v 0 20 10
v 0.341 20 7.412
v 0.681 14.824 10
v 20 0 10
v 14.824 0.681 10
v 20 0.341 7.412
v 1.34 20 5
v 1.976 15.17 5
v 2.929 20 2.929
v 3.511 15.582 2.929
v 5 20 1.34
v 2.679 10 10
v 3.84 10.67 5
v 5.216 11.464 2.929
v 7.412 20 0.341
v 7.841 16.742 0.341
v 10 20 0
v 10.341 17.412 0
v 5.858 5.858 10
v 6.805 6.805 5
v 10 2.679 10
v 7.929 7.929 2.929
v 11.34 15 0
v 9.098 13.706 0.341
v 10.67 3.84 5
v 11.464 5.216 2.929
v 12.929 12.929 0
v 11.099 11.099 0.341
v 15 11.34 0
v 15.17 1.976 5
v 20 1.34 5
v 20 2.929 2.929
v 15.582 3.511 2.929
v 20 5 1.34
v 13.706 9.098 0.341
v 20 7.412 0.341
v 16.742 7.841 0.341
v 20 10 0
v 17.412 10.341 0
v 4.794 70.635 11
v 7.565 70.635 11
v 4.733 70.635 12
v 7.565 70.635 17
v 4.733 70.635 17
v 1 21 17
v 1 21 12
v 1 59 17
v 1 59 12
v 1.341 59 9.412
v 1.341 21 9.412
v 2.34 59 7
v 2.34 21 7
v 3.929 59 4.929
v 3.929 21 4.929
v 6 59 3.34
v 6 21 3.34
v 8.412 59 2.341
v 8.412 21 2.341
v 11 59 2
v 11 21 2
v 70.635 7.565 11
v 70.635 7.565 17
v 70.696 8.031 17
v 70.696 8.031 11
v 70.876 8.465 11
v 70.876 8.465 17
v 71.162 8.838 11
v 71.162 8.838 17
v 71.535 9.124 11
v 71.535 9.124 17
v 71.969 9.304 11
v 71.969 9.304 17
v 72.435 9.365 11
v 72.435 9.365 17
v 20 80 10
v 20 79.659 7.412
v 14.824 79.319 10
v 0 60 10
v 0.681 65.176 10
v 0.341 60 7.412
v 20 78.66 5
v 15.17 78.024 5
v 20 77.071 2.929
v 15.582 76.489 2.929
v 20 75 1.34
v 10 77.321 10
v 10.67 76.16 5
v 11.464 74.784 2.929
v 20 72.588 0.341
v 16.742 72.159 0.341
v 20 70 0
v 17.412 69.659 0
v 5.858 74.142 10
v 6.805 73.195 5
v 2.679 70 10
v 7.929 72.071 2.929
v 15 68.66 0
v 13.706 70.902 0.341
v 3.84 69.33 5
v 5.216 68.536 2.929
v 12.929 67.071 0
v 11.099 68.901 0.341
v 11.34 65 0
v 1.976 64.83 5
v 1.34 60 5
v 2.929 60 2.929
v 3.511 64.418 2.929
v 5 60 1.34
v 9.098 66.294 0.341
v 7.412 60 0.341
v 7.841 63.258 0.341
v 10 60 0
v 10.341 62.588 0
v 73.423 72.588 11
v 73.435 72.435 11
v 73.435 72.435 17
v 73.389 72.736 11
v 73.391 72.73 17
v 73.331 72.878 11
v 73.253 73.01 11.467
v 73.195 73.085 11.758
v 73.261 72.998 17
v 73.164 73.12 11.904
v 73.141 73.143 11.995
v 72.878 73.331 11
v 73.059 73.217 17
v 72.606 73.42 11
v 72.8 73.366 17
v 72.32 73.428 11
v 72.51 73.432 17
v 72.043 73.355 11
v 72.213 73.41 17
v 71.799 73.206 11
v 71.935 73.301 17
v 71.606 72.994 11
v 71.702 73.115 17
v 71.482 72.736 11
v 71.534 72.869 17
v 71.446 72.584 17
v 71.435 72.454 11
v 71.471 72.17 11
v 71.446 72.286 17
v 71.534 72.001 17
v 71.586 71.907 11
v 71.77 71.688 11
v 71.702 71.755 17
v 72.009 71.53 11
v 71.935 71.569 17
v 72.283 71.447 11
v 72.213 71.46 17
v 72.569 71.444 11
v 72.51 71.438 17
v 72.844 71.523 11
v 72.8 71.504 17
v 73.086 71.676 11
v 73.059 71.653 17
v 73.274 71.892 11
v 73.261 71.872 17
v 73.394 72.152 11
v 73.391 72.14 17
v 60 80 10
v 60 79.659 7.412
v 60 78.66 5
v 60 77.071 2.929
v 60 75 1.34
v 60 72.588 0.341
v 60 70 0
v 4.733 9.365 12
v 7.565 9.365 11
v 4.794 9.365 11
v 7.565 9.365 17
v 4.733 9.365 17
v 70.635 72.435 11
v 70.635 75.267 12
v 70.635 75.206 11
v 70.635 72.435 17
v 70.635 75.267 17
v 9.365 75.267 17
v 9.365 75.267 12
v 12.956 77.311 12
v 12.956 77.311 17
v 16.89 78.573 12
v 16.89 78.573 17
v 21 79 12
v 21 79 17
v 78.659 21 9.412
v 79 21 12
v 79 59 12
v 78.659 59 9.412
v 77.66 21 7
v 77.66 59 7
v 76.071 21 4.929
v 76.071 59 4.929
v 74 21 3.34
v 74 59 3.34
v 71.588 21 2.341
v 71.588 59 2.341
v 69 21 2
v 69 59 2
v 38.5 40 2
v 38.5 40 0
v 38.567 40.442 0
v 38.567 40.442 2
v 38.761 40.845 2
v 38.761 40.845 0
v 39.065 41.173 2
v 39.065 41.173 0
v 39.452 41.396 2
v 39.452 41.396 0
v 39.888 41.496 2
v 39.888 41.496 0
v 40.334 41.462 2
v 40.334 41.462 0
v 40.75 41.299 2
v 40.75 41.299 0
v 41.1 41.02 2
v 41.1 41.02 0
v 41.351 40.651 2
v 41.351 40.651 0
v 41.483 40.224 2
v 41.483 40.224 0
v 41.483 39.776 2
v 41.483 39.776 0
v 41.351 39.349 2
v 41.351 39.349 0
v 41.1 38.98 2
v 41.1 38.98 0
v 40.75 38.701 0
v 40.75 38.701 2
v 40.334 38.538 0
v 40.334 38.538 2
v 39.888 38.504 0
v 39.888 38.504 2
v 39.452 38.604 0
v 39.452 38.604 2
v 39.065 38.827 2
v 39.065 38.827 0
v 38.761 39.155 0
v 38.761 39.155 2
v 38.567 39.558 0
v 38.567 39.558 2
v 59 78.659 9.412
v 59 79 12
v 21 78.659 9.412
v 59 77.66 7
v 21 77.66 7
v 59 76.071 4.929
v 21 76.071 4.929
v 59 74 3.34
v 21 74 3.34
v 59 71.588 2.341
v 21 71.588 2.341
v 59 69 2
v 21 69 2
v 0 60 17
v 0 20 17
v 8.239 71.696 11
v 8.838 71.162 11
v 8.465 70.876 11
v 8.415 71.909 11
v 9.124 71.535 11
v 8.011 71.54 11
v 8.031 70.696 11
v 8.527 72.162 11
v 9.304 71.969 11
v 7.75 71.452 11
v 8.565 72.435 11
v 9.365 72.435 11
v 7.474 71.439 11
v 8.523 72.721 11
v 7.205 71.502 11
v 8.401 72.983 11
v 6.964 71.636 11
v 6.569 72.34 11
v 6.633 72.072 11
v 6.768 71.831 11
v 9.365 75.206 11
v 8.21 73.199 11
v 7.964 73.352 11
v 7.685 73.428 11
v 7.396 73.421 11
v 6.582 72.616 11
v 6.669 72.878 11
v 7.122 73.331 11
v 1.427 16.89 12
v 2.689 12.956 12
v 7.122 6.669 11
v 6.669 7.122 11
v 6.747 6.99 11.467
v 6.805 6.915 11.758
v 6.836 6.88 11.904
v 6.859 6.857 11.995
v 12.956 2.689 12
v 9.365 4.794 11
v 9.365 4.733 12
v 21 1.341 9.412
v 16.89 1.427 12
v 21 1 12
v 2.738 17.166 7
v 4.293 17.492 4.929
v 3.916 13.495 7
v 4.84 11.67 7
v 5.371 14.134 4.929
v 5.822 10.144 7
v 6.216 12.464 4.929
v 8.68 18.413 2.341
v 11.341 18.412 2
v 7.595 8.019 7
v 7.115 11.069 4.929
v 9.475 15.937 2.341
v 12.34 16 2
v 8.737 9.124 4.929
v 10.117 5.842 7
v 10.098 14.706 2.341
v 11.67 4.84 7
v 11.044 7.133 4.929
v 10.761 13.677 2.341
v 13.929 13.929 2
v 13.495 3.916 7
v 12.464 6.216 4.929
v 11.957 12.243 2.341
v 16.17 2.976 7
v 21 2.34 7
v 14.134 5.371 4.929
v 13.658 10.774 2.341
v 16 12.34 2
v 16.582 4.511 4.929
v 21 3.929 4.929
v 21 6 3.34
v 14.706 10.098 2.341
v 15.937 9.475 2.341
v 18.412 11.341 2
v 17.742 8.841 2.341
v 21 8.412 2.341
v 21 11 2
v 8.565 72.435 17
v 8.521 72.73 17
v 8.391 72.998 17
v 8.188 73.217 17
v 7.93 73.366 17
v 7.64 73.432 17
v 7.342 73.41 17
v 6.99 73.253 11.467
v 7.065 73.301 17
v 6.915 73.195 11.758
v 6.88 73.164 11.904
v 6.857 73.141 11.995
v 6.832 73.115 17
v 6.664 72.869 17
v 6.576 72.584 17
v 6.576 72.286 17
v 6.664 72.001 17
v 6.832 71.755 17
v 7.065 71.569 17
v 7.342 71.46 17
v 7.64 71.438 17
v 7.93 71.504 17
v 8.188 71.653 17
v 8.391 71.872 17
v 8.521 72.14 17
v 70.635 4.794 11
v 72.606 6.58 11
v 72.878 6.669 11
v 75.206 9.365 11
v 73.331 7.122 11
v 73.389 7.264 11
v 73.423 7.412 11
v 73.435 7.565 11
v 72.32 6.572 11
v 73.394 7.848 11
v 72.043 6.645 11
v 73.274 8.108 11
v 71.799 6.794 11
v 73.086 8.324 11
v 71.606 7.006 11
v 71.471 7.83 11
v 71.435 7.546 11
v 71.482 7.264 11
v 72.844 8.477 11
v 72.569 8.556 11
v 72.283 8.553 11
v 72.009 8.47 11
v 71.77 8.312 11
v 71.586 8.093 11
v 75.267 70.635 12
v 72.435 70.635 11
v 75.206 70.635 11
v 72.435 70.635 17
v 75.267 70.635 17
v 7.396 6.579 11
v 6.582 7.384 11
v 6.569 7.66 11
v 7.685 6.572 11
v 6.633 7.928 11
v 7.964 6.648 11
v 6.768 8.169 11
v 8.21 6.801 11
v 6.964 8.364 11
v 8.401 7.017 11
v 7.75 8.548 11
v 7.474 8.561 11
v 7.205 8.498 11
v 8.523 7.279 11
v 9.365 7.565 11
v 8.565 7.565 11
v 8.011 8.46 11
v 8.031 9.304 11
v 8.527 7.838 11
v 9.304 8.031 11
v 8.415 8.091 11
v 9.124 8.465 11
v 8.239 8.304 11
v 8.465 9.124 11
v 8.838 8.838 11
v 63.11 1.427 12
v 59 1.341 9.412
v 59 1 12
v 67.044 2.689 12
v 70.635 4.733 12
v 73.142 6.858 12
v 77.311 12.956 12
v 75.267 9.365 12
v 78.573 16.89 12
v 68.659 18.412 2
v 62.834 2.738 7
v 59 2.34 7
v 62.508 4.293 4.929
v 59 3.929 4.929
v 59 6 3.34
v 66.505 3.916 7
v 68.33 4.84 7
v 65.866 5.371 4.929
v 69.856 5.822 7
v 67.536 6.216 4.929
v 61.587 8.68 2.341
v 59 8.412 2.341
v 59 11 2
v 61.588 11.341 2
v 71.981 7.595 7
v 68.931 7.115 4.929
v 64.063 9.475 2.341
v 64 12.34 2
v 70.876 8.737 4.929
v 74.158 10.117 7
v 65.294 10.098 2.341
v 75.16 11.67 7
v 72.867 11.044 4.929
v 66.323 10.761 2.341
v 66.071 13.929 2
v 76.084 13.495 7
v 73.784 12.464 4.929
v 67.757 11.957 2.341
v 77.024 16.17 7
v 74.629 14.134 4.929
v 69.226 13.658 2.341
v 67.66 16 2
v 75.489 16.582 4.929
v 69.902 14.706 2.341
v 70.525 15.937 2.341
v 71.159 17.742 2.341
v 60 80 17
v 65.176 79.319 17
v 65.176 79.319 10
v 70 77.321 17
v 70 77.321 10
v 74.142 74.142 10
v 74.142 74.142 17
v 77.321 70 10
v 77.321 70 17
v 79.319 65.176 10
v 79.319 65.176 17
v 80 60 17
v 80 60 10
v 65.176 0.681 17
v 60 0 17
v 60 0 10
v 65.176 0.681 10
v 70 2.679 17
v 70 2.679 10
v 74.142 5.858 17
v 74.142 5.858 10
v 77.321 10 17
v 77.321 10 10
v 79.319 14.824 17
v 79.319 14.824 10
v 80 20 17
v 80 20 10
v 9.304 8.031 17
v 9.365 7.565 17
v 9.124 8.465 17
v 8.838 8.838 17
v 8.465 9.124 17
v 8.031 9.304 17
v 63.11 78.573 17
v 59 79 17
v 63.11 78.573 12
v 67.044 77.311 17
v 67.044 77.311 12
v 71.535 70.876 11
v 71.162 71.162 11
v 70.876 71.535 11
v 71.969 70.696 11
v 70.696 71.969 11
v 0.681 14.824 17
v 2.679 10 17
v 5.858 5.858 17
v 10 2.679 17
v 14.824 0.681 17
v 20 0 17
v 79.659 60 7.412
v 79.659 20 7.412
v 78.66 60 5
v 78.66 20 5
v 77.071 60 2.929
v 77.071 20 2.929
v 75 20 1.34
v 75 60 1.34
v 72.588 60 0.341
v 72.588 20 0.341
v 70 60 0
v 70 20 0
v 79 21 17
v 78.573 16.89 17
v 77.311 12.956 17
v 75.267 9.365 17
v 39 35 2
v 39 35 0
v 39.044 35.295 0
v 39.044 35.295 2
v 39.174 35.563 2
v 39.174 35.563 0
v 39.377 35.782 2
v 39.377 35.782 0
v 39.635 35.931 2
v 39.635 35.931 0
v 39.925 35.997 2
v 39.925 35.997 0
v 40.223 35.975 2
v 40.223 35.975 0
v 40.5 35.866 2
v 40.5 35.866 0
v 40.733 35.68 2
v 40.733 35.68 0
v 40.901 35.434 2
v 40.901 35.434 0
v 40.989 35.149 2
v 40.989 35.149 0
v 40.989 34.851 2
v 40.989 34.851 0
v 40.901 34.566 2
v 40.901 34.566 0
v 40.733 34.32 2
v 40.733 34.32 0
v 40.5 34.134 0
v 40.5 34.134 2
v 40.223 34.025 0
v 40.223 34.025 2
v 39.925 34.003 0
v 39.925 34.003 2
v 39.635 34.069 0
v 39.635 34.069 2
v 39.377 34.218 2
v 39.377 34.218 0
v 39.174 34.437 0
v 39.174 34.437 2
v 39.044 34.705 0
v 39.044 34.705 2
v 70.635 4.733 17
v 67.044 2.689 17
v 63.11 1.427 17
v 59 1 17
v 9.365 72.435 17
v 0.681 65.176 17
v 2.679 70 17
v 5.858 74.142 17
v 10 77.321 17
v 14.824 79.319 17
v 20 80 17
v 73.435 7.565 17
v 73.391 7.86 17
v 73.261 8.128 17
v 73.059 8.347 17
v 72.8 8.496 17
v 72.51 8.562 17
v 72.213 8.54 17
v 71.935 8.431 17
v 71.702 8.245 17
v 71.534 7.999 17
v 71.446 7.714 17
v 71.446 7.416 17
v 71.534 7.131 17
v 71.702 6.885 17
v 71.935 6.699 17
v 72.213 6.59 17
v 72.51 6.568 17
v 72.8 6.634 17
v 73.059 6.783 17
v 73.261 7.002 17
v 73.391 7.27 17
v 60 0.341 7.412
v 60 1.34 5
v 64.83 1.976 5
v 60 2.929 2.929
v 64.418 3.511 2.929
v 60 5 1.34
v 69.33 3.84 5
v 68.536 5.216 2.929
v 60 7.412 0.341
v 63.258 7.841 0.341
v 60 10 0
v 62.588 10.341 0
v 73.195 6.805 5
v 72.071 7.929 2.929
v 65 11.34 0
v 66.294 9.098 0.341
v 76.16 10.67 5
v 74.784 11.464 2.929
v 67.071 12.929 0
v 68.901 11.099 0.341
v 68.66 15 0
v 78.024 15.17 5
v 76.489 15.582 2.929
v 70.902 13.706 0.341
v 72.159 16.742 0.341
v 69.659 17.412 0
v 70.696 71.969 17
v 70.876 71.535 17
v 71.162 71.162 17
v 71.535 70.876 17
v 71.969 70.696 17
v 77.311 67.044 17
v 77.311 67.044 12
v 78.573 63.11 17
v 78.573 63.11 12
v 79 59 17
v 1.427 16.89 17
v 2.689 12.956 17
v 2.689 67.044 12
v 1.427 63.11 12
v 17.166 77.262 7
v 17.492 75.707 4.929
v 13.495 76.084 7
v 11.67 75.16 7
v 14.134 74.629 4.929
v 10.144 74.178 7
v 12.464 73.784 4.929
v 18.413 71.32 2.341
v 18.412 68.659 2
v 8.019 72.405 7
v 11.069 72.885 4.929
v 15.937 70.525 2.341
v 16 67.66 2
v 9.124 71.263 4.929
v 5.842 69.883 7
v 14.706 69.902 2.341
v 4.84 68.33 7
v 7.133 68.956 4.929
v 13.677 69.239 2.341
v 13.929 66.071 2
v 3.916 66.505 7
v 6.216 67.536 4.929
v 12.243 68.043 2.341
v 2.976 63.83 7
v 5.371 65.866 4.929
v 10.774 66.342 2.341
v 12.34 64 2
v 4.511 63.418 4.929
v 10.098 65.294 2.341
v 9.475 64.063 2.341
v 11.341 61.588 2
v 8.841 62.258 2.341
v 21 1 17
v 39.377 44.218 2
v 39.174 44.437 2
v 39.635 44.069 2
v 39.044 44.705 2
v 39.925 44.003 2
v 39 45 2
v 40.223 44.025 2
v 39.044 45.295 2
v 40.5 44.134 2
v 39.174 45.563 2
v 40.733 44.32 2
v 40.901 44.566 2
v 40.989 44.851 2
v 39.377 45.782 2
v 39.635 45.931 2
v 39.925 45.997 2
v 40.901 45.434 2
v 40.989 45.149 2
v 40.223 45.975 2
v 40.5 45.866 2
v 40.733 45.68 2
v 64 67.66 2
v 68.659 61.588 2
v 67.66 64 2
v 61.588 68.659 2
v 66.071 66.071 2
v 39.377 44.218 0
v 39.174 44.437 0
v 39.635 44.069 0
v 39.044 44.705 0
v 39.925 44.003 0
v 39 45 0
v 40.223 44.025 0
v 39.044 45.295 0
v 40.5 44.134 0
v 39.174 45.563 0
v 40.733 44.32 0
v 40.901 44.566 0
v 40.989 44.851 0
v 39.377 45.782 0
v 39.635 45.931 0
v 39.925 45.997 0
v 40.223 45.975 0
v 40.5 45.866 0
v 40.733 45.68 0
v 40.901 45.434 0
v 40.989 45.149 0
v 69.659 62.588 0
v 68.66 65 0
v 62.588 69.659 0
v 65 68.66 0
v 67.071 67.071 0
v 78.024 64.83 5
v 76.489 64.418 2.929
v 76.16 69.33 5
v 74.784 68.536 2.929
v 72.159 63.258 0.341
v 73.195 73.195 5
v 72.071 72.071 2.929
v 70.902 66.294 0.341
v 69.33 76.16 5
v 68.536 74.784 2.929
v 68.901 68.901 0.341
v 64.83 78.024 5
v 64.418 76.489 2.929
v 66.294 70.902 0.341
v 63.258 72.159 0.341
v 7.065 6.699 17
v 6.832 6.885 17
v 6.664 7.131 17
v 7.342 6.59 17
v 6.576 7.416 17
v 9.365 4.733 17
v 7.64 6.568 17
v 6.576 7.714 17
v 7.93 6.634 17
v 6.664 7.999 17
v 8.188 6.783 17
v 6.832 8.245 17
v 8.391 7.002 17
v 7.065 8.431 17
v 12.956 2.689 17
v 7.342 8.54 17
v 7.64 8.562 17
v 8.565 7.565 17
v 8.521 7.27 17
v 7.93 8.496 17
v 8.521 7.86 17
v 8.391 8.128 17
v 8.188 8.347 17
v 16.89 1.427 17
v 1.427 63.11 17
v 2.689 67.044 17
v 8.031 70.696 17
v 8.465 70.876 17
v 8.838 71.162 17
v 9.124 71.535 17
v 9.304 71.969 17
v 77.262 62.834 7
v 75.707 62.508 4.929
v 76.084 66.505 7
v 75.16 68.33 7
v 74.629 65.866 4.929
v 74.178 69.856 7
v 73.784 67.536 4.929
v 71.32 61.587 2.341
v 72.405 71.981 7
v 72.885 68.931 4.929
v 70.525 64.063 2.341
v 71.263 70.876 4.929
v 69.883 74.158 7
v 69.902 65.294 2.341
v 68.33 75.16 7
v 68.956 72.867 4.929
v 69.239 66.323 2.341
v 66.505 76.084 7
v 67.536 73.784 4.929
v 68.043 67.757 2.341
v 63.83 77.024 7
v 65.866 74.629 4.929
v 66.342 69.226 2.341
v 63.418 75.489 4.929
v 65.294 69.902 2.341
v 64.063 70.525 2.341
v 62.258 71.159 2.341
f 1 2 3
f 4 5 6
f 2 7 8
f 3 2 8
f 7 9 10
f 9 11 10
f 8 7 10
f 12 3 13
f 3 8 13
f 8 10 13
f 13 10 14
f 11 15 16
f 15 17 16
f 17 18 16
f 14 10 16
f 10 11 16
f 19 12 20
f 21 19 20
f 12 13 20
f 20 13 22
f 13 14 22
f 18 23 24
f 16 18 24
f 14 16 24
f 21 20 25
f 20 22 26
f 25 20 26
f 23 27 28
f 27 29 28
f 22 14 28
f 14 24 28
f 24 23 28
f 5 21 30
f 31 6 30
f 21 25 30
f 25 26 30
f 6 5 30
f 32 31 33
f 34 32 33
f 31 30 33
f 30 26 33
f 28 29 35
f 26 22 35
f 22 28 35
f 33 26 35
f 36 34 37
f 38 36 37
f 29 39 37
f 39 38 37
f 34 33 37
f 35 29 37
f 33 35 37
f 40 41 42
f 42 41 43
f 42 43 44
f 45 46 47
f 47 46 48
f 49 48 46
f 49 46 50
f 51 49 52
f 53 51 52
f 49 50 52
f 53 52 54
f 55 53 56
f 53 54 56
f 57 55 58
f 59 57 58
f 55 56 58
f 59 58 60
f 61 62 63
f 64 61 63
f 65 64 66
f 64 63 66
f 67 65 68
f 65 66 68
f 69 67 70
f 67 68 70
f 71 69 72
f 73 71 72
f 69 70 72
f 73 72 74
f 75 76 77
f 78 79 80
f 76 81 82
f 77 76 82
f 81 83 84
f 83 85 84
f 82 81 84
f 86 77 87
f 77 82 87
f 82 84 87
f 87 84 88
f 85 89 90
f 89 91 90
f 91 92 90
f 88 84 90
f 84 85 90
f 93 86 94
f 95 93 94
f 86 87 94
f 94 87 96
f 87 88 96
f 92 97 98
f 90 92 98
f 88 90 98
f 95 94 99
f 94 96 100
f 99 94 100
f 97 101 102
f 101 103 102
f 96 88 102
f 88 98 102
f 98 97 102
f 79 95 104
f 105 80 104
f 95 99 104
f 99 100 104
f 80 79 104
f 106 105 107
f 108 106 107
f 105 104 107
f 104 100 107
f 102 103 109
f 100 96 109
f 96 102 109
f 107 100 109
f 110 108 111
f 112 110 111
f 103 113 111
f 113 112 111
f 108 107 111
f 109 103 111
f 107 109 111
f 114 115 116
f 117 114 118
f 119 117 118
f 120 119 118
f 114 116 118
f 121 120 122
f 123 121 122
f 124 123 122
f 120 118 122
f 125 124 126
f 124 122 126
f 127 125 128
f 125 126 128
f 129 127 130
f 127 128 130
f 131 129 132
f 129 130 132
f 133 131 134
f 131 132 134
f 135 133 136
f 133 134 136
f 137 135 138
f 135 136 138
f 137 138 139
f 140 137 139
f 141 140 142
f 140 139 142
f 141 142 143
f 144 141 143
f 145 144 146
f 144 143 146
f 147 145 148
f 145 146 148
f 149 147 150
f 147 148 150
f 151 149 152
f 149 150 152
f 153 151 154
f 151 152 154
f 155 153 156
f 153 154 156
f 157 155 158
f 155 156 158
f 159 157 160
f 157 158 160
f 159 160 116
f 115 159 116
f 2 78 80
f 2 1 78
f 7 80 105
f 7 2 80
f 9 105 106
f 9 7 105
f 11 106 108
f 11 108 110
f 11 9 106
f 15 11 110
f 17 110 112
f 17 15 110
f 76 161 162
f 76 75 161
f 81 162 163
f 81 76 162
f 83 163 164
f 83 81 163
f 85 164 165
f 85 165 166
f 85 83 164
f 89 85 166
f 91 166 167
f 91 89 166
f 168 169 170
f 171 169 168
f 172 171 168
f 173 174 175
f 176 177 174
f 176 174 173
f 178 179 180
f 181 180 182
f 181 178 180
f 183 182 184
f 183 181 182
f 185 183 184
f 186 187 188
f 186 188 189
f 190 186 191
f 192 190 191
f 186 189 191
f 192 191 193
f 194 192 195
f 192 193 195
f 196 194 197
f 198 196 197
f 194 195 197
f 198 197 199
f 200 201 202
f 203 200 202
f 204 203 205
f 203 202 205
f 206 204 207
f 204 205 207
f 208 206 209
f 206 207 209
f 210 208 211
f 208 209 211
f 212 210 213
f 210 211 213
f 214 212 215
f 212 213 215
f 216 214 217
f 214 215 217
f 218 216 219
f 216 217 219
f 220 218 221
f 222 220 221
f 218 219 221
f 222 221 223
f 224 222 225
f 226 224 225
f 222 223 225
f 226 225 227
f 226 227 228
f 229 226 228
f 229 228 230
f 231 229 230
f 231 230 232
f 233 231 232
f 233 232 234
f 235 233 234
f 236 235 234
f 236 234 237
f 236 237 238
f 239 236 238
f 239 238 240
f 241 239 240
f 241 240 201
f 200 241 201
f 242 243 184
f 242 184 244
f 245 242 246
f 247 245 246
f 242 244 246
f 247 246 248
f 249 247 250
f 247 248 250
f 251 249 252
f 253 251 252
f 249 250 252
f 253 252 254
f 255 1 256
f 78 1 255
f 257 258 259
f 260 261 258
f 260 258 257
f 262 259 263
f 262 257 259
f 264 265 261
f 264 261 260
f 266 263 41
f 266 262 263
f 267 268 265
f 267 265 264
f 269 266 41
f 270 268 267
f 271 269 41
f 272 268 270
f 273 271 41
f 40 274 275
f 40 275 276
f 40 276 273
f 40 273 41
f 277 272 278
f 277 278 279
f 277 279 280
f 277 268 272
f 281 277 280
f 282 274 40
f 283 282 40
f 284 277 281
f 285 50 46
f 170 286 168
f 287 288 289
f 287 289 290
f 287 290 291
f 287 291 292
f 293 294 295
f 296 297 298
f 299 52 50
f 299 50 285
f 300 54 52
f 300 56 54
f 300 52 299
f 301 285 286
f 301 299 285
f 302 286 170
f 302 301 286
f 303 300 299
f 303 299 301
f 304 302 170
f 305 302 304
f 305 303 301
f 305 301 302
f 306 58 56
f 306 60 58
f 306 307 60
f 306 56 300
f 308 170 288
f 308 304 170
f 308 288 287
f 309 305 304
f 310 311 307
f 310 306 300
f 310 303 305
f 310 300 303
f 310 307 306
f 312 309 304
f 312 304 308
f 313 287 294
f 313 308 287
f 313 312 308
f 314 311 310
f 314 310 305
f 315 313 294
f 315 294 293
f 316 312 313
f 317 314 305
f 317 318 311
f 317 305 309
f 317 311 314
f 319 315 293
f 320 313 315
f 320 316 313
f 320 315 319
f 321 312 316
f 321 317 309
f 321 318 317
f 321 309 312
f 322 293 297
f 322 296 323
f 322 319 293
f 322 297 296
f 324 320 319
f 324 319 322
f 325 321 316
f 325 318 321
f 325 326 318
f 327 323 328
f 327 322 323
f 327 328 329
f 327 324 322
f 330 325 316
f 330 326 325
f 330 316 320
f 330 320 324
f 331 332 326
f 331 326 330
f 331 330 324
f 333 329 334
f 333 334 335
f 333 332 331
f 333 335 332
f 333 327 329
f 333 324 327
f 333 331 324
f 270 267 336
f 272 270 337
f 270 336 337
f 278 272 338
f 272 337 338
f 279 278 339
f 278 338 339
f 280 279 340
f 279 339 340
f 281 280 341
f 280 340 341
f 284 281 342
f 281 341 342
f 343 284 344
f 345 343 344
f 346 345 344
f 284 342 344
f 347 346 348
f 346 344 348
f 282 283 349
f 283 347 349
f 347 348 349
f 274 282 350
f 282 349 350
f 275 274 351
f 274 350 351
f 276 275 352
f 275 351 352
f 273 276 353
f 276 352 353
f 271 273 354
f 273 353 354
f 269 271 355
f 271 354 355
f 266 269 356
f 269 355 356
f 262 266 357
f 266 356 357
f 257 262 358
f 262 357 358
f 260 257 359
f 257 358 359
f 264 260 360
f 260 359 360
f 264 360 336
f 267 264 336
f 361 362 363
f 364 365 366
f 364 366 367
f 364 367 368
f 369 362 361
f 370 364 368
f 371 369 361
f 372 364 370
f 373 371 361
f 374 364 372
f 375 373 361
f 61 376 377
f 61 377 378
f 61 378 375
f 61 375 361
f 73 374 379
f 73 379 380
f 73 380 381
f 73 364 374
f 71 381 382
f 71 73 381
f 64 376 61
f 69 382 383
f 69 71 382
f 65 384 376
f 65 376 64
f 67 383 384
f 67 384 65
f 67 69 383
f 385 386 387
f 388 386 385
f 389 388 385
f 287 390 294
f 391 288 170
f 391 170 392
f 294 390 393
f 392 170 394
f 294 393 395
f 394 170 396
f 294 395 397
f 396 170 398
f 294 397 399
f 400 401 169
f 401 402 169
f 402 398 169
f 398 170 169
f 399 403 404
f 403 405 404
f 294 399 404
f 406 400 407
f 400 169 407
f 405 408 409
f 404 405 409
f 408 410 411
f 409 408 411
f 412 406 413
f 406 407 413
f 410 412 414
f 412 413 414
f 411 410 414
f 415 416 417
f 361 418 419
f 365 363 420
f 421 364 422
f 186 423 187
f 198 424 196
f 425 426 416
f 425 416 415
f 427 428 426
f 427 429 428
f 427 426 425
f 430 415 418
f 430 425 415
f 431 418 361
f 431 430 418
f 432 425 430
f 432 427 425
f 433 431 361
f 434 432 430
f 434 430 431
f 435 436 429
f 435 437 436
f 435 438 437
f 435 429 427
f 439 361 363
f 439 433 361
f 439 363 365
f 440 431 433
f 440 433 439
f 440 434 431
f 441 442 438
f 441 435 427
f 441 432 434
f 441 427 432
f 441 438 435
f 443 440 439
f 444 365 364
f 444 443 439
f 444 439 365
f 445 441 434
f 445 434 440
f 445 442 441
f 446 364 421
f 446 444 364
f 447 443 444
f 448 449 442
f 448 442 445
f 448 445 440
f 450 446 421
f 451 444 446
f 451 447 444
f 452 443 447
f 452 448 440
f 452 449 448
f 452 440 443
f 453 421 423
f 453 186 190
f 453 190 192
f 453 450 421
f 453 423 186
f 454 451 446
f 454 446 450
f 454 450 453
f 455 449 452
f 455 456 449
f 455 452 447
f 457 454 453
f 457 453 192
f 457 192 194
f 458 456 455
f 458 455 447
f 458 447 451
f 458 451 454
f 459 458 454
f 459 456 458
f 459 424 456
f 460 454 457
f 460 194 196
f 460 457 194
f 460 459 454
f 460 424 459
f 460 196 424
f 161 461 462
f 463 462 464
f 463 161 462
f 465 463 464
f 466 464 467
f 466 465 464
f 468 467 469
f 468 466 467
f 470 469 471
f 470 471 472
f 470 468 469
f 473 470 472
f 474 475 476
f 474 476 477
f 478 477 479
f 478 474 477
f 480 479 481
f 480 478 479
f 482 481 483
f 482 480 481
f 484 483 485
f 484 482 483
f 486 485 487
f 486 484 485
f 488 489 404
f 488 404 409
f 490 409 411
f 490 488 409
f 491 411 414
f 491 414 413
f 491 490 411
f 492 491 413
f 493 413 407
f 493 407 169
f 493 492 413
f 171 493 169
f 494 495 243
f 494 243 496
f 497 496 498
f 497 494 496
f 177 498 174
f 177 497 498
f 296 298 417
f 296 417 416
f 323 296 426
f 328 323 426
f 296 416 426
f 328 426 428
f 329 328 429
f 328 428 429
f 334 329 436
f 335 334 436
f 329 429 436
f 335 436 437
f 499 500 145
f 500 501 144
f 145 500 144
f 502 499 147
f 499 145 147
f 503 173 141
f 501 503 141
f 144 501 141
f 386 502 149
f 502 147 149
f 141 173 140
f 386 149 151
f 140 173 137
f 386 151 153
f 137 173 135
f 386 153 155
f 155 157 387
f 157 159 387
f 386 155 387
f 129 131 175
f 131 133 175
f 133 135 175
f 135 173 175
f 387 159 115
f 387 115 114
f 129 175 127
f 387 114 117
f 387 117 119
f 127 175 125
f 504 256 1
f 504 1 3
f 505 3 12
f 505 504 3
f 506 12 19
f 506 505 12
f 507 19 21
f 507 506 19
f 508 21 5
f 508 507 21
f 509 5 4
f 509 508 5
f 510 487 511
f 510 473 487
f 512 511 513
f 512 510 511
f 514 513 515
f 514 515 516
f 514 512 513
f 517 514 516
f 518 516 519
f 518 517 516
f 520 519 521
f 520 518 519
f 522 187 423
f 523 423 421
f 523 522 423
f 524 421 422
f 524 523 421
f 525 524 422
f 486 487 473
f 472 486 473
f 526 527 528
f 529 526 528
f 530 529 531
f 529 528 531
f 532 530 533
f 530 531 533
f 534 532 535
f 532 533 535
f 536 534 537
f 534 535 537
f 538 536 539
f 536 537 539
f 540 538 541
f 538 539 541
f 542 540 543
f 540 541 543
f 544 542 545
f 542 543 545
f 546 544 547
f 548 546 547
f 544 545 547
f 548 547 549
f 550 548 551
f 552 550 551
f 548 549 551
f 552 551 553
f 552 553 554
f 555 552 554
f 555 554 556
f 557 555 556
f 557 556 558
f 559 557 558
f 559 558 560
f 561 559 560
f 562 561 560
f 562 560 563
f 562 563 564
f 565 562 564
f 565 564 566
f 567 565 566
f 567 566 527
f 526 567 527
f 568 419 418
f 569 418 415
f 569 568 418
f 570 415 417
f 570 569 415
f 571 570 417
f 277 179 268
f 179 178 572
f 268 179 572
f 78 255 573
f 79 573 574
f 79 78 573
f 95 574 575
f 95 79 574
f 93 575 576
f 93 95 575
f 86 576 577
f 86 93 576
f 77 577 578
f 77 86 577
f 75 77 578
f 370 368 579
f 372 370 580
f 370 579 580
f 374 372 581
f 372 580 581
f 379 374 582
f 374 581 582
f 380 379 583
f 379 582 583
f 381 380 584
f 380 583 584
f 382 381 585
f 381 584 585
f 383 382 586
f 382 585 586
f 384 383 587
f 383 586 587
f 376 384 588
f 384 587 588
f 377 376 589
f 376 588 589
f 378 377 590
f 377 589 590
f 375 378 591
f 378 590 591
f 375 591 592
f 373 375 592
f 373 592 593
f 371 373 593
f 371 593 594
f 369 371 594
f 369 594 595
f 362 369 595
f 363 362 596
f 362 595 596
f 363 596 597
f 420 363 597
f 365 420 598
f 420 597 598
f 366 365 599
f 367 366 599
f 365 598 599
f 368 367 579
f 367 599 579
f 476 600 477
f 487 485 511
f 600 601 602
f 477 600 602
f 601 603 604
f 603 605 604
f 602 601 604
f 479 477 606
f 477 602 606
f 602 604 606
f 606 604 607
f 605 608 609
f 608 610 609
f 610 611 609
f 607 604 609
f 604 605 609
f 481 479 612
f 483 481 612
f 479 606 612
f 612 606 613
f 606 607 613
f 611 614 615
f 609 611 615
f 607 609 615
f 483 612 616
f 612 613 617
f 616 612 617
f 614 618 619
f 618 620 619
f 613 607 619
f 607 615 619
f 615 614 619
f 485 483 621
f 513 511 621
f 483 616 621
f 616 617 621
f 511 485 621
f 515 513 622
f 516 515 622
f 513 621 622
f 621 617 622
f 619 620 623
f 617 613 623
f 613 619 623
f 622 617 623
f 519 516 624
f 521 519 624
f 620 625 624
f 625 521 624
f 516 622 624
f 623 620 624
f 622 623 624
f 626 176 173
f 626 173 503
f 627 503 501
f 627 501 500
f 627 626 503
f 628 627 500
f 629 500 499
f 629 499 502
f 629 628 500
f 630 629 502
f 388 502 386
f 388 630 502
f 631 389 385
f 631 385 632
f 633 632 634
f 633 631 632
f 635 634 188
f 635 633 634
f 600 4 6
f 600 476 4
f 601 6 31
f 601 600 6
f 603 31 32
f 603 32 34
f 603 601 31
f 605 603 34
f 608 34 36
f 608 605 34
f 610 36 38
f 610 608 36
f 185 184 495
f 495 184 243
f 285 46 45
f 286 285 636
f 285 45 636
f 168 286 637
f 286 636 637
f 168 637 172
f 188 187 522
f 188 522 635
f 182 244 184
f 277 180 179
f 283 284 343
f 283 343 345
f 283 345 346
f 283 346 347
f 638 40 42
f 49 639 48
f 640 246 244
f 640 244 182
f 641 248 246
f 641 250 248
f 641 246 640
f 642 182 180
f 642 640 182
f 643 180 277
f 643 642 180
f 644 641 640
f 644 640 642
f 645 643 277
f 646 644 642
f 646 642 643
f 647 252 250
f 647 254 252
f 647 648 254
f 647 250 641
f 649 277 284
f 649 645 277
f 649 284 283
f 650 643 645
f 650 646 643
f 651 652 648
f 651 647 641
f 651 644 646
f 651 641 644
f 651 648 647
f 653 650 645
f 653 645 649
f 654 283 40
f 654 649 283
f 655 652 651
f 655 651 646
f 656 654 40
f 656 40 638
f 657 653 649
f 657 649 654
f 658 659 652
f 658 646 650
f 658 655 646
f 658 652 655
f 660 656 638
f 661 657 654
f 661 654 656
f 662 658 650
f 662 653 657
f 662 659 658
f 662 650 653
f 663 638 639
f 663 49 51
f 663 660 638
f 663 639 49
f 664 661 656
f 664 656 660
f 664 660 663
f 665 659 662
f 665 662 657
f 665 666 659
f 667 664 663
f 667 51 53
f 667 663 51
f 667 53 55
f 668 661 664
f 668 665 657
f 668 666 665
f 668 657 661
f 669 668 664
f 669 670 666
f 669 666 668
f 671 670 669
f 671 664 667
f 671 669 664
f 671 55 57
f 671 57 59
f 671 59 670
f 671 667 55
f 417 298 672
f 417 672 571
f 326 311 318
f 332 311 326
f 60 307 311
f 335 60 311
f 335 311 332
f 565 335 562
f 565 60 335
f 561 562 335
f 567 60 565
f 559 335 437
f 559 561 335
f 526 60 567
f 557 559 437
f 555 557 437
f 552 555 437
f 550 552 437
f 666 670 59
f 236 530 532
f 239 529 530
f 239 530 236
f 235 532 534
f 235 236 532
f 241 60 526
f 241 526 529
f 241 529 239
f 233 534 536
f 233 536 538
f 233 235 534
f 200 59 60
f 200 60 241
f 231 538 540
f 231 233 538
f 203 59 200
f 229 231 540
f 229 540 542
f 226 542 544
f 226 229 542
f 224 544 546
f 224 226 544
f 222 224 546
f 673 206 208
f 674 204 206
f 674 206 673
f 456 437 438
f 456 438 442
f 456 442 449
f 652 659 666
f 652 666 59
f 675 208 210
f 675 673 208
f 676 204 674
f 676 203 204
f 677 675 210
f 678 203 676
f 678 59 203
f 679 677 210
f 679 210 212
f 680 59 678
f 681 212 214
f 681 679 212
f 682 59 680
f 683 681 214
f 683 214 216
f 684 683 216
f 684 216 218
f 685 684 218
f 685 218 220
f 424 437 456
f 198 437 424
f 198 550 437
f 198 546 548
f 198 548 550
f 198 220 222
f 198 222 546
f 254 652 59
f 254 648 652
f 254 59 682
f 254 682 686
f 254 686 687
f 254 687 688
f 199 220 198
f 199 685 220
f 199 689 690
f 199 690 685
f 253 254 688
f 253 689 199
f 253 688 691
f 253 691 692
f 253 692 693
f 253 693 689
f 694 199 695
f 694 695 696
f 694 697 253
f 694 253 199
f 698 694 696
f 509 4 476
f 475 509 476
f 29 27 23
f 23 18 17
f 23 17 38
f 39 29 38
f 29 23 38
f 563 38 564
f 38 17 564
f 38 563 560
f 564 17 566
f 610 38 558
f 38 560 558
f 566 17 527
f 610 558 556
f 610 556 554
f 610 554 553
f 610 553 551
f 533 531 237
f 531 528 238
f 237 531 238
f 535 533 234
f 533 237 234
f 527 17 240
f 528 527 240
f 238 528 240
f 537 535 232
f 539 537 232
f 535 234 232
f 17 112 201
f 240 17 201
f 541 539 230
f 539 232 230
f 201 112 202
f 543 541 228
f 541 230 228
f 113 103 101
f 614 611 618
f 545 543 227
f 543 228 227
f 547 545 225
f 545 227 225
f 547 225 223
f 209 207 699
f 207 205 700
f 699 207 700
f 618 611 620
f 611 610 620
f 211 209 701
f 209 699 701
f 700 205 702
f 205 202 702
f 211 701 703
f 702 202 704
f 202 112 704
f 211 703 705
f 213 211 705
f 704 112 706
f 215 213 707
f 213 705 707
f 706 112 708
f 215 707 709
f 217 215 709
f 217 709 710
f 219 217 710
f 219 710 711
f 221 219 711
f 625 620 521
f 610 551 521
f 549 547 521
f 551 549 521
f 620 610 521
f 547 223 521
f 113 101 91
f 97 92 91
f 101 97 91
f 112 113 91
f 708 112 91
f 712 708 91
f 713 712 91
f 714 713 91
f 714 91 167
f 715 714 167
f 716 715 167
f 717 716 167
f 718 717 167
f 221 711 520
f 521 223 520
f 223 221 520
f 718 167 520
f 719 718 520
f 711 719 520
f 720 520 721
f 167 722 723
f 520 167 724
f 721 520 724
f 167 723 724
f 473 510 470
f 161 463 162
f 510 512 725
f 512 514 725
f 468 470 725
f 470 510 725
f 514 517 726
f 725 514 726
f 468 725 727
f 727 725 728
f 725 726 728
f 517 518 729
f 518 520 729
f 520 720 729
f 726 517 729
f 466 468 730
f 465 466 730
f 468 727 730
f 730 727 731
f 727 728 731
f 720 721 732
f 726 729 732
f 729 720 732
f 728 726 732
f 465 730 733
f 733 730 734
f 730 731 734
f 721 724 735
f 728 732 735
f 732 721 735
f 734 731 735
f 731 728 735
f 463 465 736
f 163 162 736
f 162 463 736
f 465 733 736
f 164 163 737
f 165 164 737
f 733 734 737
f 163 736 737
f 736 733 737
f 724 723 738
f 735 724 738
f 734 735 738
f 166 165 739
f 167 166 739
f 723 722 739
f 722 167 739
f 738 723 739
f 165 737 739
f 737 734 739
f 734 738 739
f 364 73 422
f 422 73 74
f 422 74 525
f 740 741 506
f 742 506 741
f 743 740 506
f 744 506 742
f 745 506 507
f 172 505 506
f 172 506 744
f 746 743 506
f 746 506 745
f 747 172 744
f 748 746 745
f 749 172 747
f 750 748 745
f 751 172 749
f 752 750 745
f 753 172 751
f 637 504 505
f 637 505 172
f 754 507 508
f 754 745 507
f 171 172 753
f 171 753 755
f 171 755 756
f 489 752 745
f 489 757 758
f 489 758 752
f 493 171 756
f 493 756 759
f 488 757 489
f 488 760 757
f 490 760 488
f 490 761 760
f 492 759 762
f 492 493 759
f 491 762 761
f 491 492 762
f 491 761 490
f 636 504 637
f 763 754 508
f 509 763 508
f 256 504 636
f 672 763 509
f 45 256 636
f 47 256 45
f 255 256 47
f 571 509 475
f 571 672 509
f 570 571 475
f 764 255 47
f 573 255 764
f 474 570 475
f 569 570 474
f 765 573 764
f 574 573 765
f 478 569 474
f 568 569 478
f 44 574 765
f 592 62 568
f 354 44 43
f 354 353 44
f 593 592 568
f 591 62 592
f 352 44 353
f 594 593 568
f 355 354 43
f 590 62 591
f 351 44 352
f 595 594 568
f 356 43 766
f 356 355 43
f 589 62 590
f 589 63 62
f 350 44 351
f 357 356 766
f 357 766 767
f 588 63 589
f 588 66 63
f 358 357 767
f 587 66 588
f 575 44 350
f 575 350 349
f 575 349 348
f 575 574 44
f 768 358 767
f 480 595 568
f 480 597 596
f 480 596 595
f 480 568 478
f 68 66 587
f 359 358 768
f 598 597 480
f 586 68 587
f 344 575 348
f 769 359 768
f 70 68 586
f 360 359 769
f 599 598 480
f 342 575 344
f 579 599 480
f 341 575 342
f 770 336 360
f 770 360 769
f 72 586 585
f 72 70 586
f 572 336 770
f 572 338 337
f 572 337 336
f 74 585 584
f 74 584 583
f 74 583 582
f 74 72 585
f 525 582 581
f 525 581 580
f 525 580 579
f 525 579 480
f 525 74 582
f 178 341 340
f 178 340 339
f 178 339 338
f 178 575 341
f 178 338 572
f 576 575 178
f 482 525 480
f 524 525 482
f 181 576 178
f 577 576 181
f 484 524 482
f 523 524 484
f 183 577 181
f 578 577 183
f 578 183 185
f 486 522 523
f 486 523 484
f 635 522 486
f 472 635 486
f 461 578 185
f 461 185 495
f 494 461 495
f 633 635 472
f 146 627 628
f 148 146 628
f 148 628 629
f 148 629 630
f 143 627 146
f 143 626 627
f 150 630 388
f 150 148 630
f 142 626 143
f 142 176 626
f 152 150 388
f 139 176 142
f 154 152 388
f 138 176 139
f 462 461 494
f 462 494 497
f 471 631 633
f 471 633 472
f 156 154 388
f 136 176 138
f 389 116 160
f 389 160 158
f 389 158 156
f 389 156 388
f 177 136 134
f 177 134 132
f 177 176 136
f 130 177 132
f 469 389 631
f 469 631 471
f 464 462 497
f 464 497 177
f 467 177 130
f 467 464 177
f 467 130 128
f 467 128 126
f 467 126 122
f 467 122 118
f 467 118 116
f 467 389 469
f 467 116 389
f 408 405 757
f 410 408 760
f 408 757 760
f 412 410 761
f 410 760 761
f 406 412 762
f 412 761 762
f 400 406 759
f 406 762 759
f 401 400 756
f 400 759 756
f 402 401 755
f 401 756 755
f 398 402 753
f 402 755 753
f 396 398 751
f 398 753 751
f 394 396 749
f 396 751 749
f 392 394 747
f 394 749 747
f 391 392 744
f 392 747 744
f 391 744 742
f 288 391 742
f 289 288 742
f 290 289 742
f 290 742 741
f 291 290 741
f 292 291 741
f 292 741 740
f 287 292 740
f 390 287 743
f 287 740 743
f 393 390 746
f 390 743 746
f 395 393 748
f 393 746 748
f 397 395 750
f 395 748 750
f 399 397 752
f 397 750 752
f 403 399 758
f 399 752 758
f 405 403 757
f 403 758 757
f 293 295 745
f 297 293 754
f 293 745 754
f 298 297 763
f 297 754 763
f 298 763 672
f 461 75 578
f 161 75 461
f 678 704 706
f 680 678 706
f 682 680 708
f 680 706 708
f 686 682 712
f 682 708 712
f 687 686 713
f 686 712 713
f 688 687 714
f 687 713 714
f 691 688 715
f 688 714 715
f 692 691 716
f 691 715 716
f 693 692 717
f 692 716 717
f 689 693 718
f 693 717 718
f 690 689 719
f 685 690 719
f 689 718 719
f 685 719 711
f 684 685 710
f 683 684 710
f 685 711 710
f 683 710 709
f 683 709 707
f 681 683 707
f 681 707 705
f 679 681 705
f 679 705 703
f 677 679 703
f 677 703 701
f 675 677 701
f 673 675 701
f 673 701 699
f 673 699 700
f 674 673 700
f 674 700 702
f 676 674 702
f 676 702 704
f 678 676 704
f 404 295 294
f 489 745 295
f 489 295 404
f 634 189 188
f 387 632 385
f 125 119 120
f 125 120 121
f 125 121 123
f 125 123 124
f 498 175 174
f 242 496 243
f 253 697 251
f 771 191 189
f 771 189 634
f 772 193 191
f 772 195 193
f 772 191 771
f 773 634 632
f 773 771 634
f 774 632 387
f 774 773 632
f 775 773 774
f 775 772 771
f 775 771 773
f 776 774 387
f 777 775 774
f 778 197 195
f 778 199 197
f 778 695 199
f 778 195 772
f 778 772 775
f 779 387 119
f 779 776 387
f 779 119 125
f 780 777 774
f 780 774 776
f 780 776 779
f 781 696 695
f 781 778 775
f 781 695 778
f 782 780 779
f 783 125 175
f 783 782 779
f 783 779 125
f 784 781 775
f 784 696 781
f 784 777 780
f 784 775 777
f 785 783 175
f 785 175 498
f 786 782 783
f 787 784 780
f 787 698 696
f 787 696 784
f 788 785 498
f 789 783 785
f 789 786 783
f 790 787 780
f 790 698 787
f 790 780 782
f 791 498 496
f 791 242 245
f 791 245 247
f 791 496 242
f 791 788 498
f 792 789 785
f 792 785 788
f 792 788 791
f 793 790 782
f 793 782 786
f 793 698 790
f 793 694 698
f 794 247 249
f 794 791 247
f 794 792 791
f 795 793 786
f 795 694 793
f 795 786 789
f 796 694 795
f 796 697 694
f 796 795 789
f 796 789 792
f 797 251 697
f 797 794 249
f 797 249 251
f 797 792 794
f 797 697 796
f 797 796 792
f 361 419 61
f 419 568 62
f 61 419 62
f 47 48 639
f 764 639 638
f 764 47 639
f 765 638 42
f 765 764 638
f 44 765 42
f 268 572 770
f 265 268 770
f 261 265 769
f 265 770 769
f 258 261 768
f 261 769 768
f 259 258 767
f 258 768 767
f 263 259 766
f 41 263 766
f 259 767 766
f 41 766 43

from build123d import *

# Parameters (mm, degrees)
SKETCH1_W           = 80
SKETCH1_H           = 80
BOSS_EXTRUDE1_DEPTH = 2
SKETCH2_W           = 80
SKETCH2_H           = 80
SKETCH2_W_2         = 78
SKETCH2_H_2         = 78
BOSS_EXTRUDE2_DEPTH = 15
FILLET1_R           = 20
FILLET2_R           = 10
FILLET3_R           = 20
FILLET4_R           = 10
SKETCH3_R           = 1
BOSS_EXTRUDE3_DEPTH = 6
SKETCH4_W           = 10
SKETCH4_H           = 10
BOSS_EXTRUDE4_DEPTH = 5
SKETCH5_W           = 6
SKETCH5_H           = 20
BOSS_EXTRUDE5_DEPTH = 20
CUT_EXTRUDE1_DEPTH  = 23
SKETCH7_R           = 2
CUT_EXTRUDE2_DEPTH  = 23
SKETCH8_R           = 3.5
CUT_EXTRUDE3_DEPTH  = 3
SKETCH9_R           = 1
CUT_EXTRUDE4_DEPTH  = 18
SKETCH10_R          = 1.5
CUT_EXTRUDE5_DEPTH  = 18
SKETCH12_W          = 51.714198926
SKETCH12_H          = 32.805177312
CUT_EXTRUDE7_DEPTH  = 37


with BuildPart() as part:
    # Sketch1 → Boss-Extrude1 (new body)
    with BuildSketch(Plane.XY):
        with Locations((40, 40)):
            Rectangle(SKETCH1_W, SKETCH1_H)
    extrude(amount=BOSS_EXTRUDE1_DEPTH)

    # Sketch2 → Boss-Extrude2 (add)
    with BuildSketch(Plane.XY.offset(2)):
        with Locations((40, 40)):
            Rectangle(SKETCH2_W, SKETCH2_H)
        with Locations((40, 40)):
            Rectangle(SKETCH2_W_2, SKETCH2_H_2, mode=Mode.SUBTRACT)
    extrude(amount=BOSS_EXTRUDE2_DEPTH)

    # Fillet1
    fillet1_edges = [part.edges().sort_by_distance(p)[0] for p in [
        (1, 79, 9.5),
        (1, 1, 9.5),
        (79, 1, 9.5),
        (79, 79, 9.5),
    ]]
    fillet(fillet1_edges, radius=FILLET1_R)

    # Fillet2
    fillet2_edges = [part.edges().sort_by_distance(p)[0] for p in [
        (40, 1, 2),
        (79, 40, 2),
        (40, 79, 2),
        (1, 40, 2),
        (6.857864376, 73.142135624, 2),
        (73.142135624, 73.142135624, 2),
        (6.857864376, 6.857864376, 2),
        (73.142135624, 6.857864376, 2),
    ]]
    fillet(fillet2_edges, radius=FILLET2_R)

    # Fillet3
    fillet3_edges = [part.edges().sort_by_distance(p)[0] for p in [
        (0, 80, 8.5),
        (80, 80, 8.5),
        (80, 0, 8.5),
        (0, 0, 8.5),
    ]]
    fillet(fillet3_edges, radius=FILLET3_R)

    # Fillet4
    fillet4_edges = [part.edges().sort_by_distance(p)[0] for p in [
        (80, 40, 0),
        (0, 40, 0),
        (40, 80, 0),
        (40, 0, 0),
        (5.857864376, 5.857864376, 0),
        (5.857864376, 74.142135624, 0),
        (74.142135624, 74.142135624, 0),
        (74.142135624, 5.857864376, 0),
    ]]
    fillet(fillet4_edges, radius=FILLET4_R)

    # Sketch3 → Boss-Extrude3 (add)
    with BuildSketch(Plane.XY.offset(17)):
        with BuildLine():
            Line((72.292824946, 5.37212195), (70.635028843, 4.105439789))
            Line((70.635028843, 4.105439789), (70.635028843, 7.564971157))
            ThreePointArc((70.635028843, 7.564971157), (71.162236636, 8.837763364), (72.435028843, 9.364971157))
            Line((72.435028843, 9.364971157), (76.003973901, 9.364971157))
            Line((76.003973901, 9.364971157), (72.292824946, 5.37212195))
        make_face()
        with Locations((72.435028843, 7.564971157)):
            Circle(SKETCH3_R, mode=Mode.SUBTRACT)
        with BuildLine():
            Line((9.364971157, 4.105439789), (9.364971157, 7.564971157))
            ThreePointArc((9.364971157, 7.564971157), (8.837763364, 8.837763364), (7.564971157, 9.364971157))
            Line((7.564971157, 9.364971157), (3.996026099, 9.364971157))
            Line((3.996026099, 9.364971157), (7.707175054, 5.37212195))
            Line((7.707175054, 5.37212195), (9.364971157, 4.105439789))
        make_face()
        with Locations((7.564971157, 7.564971157)):
            Circle(SKETCH3_R, mode=Mode.SUBTRACT)
        with BuildLine():
            Line((70.635028843, 75.894560211), (70.635028843, 72.435028843))
            ThreePointArc((70.635028843, 72.435028843), (71.162236636, 71.162236636), (72.435028843, 70.635028843))
            Line((72.435028843, 70.635028843), (76.003973901, 70.635028843))
            Line((76.003973901, 70.635028843), (72.292824946, 74.62787805))
            Line((72.292824946, 74.62787805), (70.635028843, 75.894560211))
        make_face()
        with Locations((72.435028843, 72.435028843)):
            Circle(SKETCH3_R, mode=Mode.SUBTRACT)
        with BuildLine():
            Line((7.707175054, 74.62787805), (9.364971157, 75.894560211))
            Line((9.364971157, 75.894560211), (9.364971157, 72.435028843))
            ThreePointArc((9.364971157, 72.435028843), (8.837763364, 71.162236636), (7.564971157, 70.635028843))
            Line((7.564971157, 70.635028843), (3.996026099, 70.635028843))
            Line((3.996026099, 70.635028843), (7.707175054, 74.62787805))
        make_face()
        with Locations((7.564971157, 72.435028843)):
            Circle(SKETCH3_R, mode=Mode.SUBTRACT)
    extrude(amount=-BOSS_EXTRUDE3_DEPTH)

    # Sketch4 → Boss-Extrude4 (add)
    with BuildSketch(Plane(origin=(0, 0, 0), x_dir=(-1, 0, 0), z_dir=(0, 0, -1))):
        with Locations((-35, 35)):
            Rectangle(SKETCH4_W, SKETCH4_H)
        with Locations((-35, 45)):
            Rectangle(SKETCH4_W, SKETCH4_H)
        with Locations((-45, 45)):
            Rectangle(SKETCH4_W, SKETCH4_H)
        with Locations((-45, 35)):
            Rectangle(SKETCH4_W, SKETCH4_H)
    extrude(amount=BOSS_EXTRUDE4_DEPTH)

    # Sketch5 → Boss-Extrude5 (add)
    with BuildSketch(Plane(origin=(0, 0, -5), x_dir=(-1, 0, 0), z_dir=(0, 0, -1))):
        with Locations((-33, 40)):
            Rectangle(SKETCH5_W, SKETCH5_H)
        with Locations((-47, 40)):
            Rectangle(SKETCH5_W, SKETCH5_H)
    extrude(amount=BOSS_EXTRUDE5_DEPTH)

    # Sketch6 → Cut-Extrude1 (cut)
    with BuildSketch(Plane.ZY.offset(-30)):
        with BuildLine():
            Line((-15, 30), (-19.756708154, 21.186247086))
            Line((-19.756708154, 21.186247086), (-29.168380108, 27.64799201))
            Line((-29.168380108, 27.64799201), (-29.168380108, 53.846153493))
            Line((-29.168380108, 53.846153493), (-15, 50))
            ThreePointArc((-15, 50), (-25, 40), (-15, 30))
        make_face()
    extrude(amount=-CUT_EXTRUDE1_DEPTH, mode=Mode.SUBTRACT)

    # Sketch7 → Cut-Extrude2 (cut)
    with BuildSketch(Plane.ZY.offset(-30)):
        with Locations((-15, 40)):
            Circle(SKETCH7_R)
    extrude(amount=-CUT_EXTRUDE2_DEPTH, mode=Mode.SUBTRACT)

    # Sketch8 → Cut-Extrude3 (cut)
    with BuildSketch(Plane.ZY.offset(-30)):
        with Locations((-15, 40)):
            Circle(SKETCH8_R)
    extrude(amount=-CUT_EXTRUDE3_DEPTH, mode=Mode.SUBTRACT)

    # Sketch9 → Cut-Extrude4 (cut)
    with BuildSketch(Plane(origin=(0, 0, -5), x_dir=(-1, 0, 0), z_dir=(0, 0, -1))):
        with Locations((-40, 45)):
            Circle(SKETCH9_R)
        with Locations((-40, 35)):
            Circle(SKETCH9_R)
    extrude(amount=-CUT_EXTRUDE4_DEPTH, mode=Mode.SUBTRACT)

    # Sketch10 → Cut-Extrude5 (cut)
    with BuildSketch(Plane(origin=(0, 0, -5), x_dir=(-1, 0, 0), z_dir=(0, 0, -1))):
        with Locations((-40, 40)):
            Circle(SKETCH10_R)
    extrude(amount=-CUT_EXTRUDE5_DEPTH, mode=Mode.SUBTRACT)

    # Sketch12 → Cut-Extrude7 (cut)
    with BuildSketch(Plane.XZ.offset(-30)):
        with Locations((40.307091443, -16.402588656)):
            Rectangle(SKETCH12_W, SKETCH12_H)
    extrude(amount=-CUT_EXTRUDE7_DEPTH, mode=Mode.SUBTRACT)


solid = part.part
